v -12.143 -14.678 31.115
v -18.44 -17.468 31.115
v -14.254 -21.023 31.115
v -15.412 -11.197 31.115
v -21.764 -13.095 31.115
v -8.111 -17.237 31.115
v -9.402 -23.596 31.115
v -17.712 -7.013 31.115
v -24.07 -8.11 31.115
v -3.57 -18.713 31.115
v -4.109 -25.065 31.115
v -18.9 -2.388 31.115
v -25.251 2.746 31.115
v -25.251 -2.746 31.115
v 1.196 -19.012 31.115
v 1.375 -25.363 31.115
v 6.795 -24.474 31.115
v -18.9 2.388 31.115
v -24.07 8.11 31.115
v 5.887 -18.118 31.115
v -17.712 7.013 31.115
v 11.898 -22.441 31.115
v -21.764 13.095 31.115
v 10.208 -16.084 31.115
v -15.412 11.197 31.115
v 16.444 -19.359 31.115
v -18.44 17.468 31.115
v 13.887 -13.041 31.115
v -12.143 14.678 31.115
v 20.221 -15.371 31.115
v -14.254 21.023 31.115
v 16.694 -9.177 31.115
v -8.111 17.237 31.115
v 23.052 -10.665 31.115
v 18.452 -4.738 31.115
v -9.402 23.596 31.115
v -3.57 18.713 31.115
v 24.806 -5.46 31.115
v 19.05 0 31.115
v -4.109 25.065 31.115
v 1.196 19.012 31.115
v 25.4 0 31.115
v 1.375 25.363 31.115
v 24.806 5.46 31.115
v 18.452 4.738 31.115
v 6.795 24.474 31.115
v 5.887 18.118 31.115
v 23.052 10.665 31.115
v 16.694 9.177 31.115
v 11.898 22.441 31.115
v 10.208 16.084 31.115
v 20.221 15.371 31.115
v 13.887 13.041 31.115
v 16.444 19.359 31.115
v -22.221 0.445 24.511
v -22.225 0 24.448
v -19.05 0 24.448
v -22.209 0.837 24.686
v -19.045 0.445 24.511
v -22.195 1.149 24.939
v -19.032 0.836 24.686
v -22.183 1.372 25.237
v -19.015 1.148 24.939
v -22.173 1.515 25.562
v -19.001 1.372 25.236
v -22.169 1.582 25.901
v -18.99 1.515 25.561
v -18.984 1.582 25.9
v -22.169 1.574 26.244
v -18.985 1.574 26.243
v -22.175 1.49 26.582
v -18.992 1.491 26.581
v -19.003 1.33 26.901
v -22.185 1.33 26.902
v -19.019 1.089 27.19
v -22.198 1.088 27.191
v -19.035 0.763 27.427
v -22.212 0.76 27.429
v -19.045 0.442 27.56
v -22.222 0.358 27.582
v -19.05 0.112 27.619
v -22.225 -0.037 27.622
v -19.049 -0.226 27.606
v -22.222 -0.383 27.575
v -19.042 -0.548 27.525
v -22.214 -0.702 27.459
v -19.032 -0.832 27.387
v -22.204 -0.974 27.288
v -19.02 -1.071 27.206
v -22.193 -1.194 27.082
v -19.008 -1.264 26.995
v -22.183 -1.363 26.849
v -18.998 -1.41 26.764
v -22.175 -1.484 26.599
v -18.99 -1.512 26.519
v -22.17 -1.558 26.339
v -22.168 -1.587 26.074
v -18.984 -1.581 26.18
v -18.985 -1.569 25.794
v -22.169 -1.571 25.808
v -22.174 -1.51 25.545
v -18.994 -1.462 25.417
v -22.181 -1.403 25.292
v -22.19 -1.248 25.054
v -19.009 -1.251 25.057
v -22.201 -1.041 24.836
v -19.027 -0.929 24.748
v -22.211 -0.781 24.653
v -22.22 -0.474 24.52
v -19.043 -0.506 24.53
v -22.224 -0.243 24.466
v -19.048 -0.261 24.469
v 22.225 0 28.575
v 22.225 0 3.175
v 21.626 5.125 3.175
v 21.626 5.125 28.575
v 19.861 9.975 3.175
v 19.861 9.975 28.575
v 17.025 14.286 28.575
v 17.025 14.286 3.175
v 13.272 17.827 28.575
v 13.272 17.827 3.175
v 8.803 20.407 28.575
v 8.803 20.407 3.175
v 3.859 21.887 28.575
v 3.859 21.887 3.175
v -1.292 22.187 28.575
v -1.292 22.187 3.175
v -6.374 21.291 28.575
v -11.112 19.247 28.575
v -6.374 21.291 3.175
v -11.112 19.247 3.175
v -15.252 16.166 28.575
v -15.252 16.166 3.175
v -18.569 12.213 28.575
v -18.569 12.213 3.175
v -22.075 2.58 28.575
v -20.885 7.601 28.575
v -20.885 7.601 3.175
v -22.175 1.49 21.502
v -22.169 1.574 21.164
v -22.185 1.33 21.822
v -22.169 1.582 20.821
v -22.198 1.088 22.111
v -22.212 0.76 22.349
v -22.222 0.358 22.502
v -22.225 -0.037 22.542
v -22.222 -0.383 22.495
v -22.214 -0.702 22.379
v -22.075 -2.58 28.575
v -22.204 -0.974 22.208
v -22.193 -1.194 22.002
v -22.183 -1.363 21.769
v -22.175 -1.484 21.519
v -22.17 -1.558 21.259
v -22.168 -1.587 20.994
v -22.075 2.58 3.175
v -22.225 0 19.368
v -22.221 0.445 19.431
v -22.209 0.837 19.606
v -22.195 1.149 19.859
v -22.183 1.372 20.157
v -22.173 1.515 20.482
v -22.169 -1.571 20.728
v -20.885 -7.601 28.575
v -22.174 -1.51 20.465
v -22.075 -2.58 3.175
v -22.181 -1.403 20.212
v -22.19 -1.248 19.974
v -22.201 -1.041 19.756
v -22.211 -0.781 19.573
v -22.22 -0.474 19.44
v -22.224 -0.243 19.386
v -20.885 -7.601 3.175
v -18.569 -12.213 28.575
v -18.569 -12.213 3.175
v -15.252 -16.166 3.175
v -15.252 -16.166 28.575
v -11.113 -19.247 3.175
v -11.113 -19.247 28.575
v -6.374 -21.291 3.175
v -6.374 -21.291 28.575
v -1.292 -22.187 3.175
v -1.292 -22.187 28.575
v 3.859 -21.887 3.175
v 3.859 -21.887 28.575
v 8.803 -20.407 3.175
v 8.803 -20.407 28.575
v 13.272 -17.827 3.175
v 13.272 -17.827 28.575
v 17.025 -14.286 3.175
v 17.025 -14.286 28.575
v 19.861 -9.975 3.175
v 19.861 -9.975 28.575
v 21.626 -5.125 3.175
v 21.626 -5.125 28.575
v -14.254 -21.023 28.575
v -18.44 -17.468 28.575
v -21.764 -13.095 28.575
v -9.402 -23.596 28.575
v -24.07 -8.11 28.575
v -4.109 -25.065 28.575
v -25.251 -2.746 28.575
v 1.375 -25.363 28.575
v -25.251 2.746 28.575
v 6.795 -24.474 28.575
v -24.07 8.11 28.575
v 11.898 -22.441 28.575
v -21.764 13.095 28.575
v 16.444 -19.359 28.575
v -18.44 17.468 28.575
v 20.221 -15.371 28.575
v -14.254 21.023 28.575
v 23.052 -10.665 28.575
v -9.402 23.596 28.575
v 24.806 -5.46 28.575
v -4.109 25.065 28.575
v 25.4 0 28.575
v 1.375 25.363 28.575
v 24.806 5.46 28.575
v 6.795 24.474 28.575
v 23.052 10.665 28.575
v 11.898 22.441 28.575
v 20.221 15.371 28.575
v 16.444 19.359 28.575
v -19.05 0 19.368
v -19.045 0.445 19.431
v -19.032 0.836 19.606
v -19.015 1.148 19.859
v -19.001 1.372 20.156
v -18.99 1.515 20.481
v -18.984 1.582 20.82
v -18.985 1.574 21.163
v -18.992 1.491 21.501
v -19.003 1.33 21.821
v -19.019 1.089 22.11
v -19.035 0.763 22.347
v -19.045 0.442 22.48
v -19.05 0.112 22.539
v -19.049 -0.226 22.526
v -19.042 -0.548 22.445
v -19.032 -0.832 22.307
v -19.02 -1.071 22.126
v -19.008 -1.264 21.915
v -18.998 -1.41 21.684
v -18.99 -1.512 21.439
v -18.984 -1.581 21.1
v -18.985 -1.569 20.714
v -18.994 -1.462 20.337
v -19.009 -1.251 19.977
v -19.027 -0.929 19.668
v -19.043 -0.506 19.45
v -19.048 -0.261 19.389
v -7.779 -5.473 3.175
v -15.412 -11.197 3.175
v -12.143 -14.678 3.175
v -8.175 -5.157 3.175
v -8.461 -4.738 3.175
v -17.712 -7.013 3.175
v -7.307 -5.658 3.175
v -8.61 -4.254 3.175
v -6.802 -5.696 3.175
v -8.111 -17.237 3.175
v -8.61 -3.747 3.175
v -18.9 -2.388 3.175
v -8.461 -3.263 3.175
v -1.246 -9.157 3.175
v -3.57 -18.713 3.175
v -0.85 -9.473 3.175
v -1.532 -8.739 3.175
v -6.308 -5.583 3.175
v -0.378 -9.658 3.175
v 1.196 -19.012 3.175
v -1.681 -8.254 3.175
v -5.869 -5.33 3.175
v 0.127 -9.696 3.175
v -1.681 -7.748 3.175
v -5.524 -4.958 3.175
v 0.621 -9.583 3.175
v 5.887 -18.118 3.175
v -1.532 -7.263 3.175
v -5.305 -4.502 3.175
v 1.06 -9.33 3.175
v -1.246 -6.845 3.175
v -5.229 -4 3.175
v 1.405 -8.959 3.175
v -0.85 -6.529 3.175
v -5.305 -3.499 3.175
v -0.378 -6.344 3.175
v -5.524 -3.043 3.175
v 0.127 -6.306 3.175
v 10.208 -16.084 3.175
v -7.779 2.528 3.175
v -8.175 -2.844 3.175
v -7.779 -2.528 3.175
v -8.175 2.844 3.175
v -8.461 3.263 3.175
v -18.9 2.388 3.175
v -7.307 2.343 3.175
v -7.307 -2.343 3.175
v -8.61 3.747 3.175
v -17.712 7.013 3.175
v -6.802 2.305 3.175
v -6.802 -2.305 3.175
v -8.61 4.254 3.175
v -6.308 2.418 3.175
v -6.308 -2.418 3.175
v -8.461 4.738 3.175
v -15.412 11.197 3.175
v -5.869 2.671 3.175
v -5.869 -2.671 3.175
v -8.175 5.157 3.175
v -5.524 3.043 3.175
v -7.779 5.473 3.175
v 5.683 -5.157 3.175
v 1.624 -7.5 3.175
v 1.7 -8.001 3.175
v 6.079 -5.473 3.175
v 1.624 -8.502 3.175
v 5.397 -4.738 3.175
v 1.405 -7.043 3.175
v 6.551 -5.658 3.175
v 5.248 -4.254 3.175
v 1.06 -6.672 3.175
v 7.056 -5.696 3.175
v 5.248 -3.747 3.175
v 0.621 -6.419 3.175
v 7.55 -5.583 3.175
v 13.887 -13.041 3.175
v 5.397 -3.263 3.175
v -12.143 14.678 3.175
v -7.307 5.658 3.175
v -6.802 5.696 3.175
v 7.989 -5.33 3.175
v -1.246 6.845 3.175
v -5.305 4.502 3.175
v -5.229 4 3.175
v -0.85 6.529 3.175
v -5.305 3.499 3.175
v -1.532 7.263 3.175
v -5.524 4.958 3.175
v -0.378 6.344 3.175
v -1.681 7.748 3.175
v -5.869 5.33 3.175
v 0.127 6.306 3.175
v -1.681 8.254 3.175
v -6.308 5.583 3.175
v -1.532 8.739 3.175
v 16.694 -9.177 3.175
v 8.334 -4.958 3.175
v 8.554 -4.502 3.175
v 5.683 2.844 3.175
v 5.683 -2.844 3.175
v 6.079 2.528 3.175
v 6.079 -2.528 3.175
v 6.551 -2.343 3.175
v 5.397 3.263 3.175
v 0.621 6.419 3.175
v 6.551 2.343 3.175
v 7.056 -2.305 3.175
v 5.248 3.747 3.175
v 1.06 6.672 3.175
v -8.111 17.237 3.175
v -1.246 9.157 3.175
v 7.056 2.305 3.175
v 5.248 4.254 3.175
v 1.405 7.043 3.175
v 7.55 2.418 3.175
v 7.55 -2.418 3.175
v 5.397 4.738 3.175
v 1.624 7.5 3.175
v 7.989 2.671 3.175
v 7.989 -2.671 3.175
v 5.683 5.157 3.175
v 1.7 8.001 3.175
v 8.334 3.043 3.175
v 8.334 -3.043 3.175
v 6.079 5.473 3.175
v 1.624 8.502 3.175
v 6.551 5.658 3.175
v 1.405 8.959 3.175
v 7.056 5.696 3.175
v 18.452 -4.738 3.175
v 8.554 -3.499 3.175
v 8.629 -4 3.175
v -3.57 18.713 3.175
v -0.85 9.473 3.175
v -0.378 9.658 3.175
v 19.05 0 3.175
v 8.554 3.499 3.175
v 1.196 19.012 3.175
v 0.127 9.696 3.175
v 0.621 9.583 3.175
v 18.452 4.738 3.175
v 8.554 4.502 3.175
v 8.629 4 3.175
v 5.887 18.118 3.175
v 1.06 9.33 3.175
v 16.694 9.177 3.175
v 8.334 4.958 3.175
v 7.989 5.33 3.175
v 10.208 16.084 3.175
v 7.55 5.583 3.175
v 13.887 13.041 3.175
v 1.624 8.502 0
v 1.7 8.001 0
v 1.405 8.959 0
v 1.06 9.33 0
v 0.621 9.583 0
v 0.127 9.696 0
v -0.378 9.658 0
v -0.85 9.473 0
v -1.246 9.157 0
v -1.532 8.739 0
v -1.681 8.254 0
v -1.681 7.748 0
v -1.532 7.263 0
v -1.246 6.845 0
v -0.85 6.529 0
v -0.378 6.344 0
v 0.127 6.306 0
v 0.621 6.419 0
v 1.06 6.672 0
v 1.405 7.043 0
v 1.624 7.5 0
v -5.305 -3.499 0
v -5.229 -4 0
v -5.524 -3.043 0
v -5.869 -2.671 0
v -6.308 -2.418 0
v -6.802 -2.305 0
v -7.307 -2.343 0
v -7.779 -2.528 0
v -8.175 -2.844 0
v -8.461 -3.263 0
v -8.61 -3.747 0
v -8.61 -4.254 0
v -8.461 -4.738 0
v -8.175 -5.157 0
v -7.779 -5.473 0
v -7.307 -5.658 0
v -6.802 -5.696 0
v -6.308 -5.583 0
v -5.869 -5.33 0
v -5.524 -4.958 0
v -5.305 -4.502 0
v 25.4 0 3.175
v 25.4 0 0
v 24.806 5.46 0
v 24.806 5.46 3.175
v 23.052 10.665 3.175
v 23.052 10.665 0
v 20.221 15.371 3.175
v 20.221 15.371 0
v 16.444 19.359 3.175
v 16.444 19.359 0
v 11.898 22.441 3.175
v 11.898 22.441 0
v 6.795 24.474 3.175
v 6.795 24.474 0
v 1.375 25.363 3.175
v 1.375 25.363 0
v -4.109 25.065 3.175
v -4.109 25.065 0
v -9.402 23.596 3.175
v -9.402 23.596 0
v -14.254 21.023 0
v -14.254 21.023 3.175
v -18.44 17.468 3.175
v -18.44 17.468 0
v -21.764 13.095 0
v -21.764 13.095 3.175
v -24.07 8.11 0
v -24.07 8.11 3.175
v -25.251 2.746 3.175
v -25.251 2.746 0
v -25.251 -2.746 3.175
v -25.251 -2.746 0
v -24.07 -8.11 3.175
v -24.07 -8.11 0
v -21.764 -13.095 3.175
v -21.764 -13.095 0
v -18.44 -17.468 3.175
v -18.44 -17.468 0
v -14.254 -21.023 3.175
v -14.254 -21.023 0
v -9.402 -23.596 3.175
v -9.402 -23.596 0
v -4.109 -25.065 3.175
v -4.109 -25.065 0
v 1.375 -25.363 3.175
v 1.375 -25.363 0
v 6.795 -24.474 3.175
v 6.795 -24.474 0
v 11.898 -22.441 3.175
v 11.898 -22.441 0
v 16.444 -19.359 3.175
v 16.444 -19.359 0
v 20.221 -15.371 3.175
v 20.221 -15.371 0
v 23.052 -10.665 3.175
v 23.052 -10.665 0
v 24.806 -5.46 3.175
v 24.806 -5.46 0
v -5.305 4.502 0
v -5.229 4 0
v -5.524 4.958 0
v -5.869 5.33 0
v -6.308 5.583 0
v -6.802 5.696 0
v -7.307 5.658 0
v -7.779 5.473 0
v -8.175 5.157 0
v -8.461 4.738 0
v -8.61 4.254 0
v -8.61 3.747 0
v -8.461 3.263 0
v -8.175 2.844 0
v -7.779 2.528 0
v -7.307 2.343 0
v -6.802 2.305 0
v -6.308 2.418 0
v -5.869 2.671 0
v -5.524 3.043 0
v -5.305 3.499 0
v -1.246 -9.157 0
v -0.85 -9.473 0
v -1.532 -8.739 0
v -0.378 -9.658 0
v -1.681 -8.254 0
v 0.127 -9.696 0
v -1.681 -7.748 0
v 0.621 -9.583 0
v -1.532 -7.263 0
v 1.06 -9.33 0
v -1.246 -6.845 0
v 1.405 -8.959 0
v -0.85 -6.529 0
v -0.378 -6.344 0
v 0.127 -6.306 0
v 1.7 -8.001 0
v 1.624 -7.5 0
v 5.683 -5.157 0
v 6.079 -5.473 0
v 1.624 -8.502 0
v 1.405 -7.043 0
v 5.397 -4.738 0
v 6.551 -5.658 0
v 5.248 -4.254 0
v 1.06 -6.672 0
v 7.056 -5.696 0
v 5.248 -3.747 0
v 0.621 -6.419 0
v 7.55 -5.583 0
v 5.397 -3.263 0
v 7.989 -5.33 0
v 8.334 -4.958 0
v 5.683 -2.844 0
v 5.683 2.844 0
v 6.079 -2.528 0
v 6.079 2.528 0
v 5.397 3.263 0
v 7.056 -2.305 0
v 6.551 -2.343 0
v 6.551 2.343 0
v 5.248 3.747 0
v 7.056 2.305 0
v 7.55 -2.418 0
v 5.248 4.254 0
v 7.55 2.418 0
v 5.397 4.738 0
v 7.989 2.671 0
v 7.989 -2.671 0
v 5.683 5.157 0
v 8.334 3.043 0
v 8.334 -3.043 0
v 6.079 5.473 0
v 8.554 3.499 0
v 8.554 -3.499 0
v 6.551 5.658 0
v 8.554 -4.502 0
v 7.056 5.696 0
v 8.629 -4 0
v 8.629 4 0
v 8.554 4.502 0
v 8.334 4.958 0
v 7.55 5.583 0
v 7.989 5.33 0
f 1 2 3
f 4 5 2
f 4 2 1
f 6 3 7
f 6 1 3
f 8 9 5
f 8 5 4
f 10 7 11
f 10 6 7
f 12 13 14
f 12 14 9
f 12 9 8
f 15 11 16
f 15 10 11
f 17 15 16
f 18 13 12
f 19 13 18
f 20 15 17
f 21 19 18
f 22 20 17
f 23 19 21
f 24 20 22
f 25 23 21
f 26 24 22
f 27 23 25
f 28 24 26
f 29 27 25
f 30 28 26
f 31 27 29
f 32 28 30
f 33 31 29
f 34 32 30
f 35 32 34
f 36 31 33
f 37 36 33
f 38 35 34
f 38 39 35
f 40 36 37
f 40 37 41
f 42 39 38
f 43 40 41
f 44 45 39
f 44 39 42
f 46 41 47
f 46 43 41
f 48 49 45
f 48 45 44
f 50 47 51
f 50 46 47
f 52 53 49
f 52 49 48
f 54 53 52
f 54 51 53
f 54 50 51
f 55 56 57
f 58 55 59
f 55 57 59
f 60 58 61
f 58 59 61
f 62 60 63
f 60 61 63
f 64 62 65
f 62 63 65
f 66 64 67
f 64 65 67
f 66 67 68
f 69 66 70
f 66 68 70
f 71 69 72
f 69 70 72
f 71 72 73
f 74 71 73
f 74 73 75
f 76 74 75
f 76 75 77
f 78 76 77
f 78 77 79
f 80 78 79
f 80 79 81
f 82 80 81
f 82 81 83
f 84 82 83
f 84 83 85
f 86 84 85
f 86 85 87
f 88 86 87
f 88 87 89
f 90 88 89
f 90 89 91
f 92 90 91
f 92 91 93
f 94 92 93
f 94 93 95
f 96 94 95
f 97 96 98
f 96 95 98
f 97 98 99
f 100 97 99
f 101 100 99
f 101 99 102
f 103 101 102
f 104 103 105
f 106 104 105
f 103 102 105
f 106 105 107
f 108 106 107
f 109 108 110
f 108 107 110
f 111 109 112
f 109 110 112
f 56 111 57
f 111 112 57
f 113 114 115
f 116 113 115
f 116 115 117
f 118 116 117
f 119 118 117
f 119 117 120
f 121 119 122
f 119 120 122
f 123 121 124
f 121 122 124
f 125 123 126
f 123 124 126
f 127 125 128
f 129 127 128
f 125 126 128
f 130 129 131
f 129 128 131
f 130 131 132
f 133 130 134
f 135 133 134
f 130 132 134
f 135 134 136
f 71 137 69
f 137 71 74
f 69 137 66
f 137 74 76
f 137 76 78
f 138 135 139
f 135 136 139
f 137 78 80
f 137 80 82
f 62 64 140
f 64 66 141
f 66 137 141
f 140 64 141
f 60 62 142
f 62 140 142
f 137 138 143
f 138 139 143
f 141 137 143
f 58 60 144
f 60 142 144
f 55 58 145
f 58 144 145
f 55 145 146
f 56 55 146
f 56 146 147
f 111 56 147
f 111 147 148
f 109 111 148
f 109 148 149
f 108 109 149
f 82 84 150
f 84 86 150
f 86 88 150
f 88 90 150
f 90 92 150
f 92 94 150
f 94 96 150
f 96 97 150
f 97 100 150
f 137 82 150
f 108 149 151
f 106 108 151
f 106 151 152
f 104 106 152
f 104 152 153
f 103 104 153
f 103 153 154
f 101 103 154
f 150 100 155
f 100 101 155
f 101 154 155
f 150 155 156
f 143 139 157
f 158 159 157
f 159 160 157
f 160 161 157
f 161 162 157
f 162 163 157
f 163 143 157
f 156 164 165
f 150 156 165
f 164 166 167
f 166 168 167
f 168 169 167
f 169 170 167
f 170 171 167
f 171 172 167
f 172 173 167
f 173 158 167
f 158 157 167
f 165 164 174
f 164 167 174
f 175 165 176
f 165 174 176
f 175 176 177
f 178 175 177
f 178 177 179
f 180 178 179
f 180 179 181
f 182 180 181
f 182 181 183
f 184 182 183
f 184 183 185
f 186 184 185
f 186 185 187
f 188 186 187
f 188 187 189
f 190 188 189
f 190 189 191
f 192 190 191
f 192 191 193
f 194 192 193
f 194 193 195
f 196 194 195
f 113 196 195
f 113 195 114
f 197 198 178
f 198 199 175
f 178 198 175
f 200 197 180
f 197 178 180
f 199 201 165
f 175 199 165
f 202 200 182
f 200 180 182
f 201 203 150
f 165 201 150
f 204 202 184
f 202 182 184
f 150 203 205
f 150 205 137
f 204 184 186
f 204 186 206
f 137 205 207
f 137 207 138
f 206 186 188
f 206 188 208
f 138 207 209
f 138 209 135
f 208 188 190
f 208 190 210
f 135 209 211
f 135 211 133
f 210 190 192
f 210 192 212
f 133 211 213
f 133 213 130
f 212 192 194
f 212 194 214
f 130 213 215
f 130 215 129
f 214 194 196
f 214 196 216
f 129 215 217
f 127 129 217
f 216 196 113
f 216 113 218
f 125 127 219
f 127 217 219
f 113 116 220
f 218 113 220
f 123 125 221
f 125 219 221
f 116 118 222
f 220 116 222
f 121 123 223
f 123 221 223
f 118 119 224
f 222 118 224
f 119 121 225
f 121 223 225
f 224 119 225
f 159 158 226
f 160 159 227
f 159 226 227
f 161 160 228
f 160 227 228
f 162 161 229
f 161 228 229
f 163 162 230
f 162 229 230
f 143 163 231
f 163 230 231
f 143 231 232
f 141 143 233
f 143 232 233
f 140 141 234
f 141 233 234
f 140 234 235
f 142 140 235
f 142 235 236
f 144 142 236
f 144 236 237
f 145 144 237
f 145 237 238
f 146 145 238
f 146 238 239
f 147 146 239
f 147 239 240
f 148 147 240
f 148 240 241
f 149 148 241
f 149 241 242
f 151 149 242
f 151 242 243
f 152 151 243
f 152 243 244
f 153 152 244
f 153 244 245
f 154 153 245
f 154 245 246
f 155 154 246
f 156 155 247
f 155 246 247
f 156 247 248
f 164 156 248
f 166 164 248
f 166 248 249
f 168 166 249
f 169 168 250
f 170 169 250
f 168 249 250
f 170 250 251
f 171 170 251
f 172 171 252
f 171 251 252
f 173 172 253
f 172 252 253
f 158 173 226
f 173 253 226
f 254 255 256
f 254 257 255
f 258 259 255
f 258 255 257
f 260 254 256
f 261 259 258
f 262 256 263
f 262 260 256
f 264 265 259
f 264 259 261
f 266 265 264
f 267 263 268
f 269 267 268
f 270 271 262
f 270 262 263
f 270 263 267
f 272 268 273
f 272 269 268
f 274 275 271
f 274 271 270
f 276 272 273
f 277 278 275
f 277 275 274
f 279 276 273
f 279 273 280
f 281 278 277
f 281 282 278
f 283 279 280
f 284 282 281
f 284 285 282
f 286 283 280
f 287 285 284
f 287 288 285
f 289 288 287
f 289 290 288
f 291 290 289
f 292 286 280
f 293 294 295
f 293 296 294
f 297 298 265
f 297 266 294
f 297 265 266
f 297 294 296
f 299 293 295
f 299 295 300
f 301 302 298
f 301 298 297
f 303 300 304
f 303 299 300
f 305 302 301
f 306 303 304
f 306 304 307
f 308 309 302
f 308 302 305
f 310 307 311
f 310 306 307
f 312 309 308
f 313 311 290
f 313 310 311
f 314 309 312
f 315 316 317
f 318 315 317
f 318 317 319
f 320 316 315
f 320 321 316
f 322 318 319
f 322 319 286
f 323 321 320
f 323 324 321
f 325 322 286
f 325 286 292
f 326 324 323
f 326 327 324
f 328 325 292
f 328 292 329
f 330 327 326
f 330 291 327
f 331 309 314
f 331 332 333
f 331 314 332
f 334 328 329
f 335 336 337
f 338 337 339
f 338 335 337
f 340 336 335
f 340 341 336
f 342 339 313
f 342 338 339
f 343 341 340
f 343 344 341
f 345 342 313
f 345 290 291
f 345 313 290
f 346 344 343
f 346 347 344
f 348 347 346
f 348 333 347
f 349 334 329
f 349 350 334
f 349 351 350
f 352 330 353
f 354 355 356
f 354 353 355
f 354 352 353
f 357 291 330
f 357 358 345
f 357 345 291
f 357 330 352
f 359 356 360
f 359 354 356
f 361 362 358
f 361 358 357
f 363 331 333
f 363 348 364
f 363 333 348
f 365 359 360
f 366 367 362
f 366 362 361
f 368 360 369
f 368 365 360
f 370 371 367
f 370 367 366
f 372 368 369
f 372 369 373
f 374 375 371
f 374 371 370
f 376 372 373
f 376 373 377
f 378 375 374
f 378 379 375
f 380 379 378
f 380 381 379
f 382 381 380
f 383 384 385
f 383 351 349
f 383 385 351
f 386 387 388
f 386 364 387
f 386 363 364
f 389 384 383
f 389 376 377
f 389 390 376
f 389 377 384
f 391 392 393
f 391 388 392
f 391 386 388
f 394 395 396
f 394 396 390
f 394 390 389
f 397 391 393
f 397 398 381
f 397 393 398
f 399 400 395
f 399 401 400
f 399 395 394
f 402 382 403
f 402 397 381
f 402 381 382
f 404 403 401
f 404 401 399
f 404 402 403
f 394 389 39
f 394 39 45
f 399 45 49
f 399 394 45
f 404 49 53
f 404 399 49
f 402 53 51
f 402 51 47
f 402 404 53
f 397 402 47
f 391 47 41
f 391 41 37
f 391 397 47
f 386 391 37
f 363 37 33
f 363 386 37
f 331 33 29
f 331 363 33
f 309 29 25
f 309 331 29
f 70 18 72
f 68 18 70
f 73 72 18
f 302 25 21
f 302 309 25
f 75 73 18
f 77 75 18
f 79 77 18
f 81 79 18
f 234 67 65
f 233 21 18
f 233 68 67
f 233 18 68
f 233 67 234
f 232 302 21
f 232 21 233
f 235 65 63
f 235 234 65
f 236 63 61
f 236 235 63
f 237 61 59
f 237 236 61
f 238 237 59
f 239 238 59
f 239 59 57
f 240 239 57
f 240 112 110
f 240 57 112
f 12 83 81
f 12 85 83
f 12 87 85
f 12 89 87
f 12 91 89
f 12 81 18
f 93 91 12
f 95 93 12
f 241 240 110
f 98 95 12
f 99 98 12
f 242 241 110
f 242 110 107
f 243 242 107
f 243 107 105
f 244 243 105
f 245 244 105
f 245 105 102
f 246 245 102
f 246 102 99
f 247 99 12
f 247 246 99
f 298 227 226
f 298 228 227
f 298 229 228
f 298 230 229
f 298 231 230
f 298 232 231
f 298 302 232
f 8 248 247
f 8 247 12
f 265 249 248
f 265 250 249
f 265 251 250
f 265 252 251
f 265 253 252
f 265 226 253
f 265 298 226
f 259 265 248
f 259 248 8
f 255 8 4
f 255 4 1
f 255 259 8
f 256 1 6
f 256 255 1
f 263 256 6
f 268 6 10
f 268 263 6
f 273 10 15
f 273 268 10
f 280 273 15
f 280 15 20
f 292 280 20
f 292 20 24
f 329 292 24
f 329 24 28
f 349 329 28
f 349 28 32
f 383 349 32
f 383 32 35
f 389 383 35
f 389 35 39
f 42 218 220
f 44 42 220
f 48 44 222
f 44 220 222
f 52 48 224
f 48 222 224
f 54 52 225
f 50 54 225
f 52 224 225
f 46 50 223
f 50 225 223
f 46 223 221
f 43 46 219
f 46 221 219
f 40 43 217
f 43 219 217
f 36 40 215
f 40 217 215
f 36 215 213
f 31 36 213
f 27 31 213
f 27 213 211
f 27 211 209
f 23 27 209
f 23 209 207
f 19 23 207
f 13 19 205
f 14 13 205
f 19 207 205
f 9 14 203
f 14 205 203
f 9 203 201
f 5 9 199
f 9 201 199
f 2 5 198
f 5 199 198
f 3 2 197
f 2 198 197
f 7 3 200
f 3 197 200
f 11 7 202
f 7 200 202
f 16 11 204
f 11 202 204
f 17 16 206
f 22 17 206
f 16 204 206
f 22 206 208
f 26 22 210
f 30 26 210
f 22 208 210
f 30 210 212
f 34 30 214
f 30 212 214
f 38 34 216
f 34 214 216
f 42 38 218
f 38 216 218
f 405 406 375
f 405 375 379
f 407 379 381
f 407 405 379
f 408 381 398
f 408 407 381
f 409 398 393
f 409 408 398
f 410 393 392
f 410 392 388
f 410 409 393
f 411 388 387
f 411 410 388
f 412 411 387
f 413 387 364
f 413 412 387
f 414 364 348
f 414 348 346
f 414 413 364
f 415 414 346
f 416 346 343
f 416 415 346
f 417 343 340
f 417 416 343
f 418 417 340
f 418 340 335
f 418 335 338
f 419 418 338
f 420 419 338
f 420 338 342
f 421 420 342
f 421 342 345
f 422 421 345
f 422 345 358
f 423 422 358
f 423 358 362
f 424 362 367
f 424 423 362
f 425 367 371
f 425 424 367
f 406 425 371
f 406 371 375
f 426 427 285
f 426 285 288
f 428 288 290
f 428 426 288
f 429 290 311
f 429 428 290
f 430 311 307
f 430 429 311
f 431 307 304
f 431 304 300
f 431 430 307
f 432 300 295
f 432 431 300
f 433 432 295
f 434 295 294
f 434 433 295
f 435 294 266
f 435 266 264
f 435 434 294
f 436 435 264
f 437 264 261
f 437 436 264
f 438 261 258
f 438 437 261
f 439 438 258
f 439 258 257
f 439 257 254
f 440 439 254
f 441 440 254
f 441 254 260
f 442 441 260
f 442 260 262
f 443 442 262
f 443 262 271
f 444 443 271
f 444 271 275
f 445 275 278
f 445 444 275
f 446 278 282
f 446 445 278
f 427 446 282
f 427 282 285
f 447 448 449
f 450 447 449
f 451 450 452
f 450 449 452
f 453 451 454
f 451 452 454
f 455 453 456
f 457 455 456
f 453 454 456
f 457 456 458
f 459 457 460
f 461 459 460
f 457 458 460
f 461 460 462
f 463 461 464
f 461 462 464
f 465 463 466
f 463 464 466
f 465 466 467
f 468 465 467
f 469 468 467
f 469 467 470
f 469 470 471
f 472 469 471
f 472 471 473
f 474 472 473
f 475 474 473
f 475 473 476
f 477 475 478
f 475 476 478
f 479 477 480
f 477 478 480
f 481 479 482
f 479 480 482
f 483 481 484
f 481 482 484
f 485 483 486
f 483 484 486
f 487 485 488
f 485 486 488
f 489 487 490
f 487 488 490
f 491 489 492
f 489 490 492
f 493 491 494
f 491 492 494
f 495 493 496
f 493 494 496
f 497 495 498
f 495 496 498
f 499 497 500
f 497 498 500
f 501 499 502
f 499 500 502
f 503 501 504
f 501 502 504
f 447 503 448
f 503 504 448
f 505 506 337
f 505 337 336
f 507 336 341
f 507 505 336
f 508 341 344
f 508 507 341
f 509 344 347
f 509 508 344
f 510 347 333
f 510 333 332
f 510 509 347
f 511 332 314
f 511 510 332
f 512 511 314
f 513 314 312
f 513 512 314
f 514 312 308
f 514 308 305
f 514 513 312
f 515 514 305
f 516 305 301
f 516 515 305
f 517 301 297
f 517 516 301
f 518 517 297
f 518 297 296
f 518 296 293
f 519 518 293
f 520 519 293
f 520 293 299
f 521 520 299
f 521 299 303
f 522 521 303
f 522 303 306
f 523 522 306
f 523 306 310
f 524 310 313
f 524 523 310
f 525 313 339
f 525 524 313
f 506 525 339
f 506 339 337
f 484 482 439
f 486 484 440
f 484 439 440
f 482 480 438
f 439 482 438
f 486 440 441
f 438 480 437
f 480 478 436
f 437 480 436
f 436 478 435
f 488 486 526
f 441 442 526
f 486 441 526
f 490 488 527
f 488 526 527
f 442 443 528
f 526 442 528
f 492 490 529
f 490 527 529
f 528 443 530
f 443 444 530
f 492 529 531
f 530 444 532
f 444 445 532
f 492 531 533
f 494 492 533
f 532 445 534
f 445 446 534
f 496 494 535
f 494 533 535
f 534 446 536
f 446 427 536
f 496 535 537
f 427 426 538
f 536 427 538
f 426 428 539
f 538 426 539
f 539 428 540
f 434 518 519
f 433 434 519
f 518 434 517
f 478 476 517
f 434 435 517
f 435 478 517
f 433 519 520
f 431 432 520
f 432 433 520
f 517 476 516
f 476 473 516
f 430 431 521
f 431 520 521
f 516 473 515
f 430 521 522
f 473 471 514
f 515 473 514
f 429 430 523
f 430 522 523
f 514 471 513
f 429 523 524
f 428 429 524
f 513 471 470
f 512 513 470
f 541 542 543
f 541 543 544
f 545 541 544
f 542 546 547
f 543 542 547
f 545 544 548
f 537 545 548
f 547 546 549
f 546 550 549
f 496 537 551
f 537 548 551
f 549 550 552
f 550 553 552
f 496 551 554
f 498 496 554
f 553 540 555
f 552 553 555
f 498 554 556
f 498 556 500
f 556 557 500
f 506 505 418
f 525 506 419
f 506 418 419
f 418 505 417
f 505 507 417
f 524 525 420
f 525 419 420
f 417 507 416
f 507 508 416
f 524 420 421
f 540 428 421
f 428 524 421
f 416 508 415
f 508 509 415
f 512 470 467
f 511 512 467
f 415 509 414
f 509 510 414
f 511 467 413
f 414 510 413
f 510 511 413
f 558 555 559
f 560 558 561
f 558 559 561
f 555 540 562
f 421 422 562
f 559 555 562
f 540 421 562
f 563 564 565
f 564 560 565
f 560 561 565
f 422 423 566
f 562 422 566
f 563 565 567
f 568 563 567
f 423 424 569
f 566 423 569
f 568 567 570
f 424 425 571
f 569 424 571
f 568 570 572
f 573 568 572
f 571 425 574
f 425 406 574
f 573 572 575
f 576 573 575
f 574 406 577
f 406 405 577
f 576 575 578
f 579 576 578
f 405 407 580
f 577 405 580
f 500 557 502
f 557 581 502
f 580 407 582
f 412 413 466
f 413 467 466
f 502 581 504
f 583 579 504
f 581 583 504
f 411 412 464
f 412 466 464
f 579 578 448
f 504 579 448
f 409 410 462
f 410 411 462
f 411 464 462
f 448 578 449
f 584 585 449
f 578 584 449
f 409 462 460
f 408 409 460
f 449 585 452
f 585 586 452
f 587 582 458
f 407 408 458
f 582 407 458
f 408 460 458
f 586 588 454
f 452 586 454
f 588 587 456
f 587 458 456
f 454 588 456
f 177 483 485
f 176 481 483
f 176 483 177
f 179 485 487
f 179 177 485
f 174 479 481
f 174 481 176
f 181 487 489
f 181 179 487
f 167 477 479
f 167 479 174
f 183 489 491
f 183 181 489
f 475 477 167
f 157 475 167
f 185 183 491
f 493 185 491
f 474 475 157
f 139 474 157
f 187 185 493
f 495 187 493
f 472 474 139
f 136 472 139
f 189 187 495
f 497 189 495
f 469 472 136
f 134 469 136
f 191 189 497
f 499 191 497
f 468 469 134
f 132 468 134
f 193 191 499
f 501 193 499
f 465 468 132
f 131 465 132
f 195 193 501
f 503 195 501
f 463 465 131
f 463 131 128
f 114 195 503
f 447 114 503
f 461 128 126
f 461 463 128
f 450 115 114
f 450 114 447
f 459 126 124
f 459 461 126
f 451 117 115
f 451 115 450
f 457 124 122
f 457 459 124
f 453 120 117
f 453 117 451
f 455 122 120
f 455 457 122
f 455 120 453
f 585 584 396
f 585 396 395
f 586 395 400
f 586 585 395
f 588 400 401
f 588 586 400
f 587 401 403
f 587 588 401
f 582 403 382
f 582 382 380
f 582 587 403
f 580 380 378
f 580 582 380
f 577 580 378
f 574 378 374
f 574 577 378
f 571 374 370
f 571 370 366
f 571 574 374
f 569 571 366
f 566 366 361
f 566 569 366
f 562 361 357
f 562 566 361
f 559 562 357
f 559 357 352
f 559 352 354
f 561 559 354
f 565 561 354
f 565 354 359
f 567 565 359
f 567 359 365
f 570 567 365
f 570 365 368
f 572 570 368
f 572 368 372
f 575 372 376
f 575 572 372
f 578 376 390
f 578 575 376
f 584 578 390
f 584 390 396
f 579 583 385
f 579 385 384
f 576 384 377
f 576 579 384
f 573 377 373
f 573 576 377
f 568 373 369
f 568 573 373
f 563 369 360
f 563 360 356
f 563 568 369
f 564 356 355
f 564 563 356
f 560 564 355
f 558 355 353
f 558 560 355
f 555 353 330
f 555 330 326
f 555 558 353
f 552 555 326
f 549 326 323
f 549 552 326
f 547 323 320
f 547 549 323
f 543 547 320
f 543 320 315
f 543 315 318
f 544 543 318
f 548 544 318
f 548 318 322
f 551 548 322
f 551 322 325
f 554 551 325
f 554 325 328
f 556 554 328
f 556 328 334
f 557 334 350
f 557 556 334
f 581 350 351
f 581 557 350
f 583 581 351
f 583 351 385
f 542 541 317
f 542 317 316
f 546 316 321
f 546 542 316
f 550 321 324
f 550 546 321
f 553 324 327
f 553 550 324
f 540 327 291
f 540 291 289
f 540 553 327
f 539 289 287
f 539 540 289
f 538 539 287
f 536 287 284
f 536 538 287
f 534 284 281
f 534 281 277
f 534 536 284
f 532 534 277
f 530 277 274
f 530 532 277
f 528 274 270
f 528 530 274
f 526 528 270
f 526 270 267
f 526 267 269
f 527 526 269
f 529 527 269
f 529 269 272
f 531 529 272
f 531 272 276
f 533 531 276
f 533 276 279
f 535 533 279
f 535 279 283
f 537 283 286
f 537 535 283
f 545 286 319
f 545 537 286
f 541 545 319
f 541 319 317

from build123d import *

# Parameters (mm, degrees)
SKETCH1_R           = 25.4
SKETCH1_R_2         = 1.7
BOSS_EXTRUDE1_DEPTH = 3.175
SKETCH4_R           = 22.225
SKETCH4_R_2         = 19.05
BOSS_EXTRUDE2_DEPTH = 25.4
SKETCH5_R           = 25.4
SKETCH5_R_2         = 19.05
BOSS_EXTRUDE3_DEPTH = 2.54
SKETCH6_R           = 1.5875
CUT_EXTRUDE1_DEPTH  = 26.4


with BuildPart() as part:
    # Sketch1 → Boss-Extrude1 (new body)
    with BuildSketch(Plane.XY):
        Circle(SKETCH1_R)
        with Locations((0, -8.001)):
            Circle(SKETCH1_R_2, mode=Mode.SUBTRACT)
        with Locations((0, 8.001)):
            Circle(SKETCH1_R_2, mode=Mode.SUBTRACT)
        with Locations((-6.929069256, 4.0005)):
            Circle(SKETCH1_R_2, mode=Mode.SUBTRACT)
        with Locations((-6.929069256, -4.0005)):
            Circle(SKETCH1_R_2, mode=Mode.SUBTRACT)
        with Locations((6.929069256, -4.0005)):
            Circle(SKETCH1_R_2, mode=Mode.SUBTRACT)
        with Locations((6.929069256, 4.0005)):
            Circle(SKETCH1_R_2, mode=Mode.SUBTRACT)
    extrude(amount=BOSS_EXTRUDE1_DEPTH)

    # Sketch4 → Boss-Extrude2 (add)
    with BuildSketch(Plane.XY.offset(3.175)):
        Circle(SKETCH4_R)
        Circle(SKETCH4_R_2, mode=Mode.SUBTRACT)
    extrude(amount=BOSS_EXTRUDE2_DEPTH)

    # Sketch5 → Boss-Extrude3 (add)
    with BuildSketch(Plane.XY.offset(28.575)):
        Circle(SKETCH5_R)
        Circle(SKETCH5_R_2, mode=Mode.SUBTRACT)
    extrude(amount=BOSS_EXTRUDE3_DEPTH)

    # Sketch6 → Cut-Extrude1 (cut, through all)
    with BuildSketch(Plane(origin=(0, 0, 0), x_dir=(0, 0, -1), z_dir=(1, 0, 0))):
        with Locations((-26.035, 0)):
            Circle(SKETCH6_R)
        with Locations((-20.955, 0)):
            Circle(SKETCH6_R)
    extrude(amount=-CUT_EXTRUDE1_DEPTH, mode=Mode.SUBTRACT)


solid = part.part
